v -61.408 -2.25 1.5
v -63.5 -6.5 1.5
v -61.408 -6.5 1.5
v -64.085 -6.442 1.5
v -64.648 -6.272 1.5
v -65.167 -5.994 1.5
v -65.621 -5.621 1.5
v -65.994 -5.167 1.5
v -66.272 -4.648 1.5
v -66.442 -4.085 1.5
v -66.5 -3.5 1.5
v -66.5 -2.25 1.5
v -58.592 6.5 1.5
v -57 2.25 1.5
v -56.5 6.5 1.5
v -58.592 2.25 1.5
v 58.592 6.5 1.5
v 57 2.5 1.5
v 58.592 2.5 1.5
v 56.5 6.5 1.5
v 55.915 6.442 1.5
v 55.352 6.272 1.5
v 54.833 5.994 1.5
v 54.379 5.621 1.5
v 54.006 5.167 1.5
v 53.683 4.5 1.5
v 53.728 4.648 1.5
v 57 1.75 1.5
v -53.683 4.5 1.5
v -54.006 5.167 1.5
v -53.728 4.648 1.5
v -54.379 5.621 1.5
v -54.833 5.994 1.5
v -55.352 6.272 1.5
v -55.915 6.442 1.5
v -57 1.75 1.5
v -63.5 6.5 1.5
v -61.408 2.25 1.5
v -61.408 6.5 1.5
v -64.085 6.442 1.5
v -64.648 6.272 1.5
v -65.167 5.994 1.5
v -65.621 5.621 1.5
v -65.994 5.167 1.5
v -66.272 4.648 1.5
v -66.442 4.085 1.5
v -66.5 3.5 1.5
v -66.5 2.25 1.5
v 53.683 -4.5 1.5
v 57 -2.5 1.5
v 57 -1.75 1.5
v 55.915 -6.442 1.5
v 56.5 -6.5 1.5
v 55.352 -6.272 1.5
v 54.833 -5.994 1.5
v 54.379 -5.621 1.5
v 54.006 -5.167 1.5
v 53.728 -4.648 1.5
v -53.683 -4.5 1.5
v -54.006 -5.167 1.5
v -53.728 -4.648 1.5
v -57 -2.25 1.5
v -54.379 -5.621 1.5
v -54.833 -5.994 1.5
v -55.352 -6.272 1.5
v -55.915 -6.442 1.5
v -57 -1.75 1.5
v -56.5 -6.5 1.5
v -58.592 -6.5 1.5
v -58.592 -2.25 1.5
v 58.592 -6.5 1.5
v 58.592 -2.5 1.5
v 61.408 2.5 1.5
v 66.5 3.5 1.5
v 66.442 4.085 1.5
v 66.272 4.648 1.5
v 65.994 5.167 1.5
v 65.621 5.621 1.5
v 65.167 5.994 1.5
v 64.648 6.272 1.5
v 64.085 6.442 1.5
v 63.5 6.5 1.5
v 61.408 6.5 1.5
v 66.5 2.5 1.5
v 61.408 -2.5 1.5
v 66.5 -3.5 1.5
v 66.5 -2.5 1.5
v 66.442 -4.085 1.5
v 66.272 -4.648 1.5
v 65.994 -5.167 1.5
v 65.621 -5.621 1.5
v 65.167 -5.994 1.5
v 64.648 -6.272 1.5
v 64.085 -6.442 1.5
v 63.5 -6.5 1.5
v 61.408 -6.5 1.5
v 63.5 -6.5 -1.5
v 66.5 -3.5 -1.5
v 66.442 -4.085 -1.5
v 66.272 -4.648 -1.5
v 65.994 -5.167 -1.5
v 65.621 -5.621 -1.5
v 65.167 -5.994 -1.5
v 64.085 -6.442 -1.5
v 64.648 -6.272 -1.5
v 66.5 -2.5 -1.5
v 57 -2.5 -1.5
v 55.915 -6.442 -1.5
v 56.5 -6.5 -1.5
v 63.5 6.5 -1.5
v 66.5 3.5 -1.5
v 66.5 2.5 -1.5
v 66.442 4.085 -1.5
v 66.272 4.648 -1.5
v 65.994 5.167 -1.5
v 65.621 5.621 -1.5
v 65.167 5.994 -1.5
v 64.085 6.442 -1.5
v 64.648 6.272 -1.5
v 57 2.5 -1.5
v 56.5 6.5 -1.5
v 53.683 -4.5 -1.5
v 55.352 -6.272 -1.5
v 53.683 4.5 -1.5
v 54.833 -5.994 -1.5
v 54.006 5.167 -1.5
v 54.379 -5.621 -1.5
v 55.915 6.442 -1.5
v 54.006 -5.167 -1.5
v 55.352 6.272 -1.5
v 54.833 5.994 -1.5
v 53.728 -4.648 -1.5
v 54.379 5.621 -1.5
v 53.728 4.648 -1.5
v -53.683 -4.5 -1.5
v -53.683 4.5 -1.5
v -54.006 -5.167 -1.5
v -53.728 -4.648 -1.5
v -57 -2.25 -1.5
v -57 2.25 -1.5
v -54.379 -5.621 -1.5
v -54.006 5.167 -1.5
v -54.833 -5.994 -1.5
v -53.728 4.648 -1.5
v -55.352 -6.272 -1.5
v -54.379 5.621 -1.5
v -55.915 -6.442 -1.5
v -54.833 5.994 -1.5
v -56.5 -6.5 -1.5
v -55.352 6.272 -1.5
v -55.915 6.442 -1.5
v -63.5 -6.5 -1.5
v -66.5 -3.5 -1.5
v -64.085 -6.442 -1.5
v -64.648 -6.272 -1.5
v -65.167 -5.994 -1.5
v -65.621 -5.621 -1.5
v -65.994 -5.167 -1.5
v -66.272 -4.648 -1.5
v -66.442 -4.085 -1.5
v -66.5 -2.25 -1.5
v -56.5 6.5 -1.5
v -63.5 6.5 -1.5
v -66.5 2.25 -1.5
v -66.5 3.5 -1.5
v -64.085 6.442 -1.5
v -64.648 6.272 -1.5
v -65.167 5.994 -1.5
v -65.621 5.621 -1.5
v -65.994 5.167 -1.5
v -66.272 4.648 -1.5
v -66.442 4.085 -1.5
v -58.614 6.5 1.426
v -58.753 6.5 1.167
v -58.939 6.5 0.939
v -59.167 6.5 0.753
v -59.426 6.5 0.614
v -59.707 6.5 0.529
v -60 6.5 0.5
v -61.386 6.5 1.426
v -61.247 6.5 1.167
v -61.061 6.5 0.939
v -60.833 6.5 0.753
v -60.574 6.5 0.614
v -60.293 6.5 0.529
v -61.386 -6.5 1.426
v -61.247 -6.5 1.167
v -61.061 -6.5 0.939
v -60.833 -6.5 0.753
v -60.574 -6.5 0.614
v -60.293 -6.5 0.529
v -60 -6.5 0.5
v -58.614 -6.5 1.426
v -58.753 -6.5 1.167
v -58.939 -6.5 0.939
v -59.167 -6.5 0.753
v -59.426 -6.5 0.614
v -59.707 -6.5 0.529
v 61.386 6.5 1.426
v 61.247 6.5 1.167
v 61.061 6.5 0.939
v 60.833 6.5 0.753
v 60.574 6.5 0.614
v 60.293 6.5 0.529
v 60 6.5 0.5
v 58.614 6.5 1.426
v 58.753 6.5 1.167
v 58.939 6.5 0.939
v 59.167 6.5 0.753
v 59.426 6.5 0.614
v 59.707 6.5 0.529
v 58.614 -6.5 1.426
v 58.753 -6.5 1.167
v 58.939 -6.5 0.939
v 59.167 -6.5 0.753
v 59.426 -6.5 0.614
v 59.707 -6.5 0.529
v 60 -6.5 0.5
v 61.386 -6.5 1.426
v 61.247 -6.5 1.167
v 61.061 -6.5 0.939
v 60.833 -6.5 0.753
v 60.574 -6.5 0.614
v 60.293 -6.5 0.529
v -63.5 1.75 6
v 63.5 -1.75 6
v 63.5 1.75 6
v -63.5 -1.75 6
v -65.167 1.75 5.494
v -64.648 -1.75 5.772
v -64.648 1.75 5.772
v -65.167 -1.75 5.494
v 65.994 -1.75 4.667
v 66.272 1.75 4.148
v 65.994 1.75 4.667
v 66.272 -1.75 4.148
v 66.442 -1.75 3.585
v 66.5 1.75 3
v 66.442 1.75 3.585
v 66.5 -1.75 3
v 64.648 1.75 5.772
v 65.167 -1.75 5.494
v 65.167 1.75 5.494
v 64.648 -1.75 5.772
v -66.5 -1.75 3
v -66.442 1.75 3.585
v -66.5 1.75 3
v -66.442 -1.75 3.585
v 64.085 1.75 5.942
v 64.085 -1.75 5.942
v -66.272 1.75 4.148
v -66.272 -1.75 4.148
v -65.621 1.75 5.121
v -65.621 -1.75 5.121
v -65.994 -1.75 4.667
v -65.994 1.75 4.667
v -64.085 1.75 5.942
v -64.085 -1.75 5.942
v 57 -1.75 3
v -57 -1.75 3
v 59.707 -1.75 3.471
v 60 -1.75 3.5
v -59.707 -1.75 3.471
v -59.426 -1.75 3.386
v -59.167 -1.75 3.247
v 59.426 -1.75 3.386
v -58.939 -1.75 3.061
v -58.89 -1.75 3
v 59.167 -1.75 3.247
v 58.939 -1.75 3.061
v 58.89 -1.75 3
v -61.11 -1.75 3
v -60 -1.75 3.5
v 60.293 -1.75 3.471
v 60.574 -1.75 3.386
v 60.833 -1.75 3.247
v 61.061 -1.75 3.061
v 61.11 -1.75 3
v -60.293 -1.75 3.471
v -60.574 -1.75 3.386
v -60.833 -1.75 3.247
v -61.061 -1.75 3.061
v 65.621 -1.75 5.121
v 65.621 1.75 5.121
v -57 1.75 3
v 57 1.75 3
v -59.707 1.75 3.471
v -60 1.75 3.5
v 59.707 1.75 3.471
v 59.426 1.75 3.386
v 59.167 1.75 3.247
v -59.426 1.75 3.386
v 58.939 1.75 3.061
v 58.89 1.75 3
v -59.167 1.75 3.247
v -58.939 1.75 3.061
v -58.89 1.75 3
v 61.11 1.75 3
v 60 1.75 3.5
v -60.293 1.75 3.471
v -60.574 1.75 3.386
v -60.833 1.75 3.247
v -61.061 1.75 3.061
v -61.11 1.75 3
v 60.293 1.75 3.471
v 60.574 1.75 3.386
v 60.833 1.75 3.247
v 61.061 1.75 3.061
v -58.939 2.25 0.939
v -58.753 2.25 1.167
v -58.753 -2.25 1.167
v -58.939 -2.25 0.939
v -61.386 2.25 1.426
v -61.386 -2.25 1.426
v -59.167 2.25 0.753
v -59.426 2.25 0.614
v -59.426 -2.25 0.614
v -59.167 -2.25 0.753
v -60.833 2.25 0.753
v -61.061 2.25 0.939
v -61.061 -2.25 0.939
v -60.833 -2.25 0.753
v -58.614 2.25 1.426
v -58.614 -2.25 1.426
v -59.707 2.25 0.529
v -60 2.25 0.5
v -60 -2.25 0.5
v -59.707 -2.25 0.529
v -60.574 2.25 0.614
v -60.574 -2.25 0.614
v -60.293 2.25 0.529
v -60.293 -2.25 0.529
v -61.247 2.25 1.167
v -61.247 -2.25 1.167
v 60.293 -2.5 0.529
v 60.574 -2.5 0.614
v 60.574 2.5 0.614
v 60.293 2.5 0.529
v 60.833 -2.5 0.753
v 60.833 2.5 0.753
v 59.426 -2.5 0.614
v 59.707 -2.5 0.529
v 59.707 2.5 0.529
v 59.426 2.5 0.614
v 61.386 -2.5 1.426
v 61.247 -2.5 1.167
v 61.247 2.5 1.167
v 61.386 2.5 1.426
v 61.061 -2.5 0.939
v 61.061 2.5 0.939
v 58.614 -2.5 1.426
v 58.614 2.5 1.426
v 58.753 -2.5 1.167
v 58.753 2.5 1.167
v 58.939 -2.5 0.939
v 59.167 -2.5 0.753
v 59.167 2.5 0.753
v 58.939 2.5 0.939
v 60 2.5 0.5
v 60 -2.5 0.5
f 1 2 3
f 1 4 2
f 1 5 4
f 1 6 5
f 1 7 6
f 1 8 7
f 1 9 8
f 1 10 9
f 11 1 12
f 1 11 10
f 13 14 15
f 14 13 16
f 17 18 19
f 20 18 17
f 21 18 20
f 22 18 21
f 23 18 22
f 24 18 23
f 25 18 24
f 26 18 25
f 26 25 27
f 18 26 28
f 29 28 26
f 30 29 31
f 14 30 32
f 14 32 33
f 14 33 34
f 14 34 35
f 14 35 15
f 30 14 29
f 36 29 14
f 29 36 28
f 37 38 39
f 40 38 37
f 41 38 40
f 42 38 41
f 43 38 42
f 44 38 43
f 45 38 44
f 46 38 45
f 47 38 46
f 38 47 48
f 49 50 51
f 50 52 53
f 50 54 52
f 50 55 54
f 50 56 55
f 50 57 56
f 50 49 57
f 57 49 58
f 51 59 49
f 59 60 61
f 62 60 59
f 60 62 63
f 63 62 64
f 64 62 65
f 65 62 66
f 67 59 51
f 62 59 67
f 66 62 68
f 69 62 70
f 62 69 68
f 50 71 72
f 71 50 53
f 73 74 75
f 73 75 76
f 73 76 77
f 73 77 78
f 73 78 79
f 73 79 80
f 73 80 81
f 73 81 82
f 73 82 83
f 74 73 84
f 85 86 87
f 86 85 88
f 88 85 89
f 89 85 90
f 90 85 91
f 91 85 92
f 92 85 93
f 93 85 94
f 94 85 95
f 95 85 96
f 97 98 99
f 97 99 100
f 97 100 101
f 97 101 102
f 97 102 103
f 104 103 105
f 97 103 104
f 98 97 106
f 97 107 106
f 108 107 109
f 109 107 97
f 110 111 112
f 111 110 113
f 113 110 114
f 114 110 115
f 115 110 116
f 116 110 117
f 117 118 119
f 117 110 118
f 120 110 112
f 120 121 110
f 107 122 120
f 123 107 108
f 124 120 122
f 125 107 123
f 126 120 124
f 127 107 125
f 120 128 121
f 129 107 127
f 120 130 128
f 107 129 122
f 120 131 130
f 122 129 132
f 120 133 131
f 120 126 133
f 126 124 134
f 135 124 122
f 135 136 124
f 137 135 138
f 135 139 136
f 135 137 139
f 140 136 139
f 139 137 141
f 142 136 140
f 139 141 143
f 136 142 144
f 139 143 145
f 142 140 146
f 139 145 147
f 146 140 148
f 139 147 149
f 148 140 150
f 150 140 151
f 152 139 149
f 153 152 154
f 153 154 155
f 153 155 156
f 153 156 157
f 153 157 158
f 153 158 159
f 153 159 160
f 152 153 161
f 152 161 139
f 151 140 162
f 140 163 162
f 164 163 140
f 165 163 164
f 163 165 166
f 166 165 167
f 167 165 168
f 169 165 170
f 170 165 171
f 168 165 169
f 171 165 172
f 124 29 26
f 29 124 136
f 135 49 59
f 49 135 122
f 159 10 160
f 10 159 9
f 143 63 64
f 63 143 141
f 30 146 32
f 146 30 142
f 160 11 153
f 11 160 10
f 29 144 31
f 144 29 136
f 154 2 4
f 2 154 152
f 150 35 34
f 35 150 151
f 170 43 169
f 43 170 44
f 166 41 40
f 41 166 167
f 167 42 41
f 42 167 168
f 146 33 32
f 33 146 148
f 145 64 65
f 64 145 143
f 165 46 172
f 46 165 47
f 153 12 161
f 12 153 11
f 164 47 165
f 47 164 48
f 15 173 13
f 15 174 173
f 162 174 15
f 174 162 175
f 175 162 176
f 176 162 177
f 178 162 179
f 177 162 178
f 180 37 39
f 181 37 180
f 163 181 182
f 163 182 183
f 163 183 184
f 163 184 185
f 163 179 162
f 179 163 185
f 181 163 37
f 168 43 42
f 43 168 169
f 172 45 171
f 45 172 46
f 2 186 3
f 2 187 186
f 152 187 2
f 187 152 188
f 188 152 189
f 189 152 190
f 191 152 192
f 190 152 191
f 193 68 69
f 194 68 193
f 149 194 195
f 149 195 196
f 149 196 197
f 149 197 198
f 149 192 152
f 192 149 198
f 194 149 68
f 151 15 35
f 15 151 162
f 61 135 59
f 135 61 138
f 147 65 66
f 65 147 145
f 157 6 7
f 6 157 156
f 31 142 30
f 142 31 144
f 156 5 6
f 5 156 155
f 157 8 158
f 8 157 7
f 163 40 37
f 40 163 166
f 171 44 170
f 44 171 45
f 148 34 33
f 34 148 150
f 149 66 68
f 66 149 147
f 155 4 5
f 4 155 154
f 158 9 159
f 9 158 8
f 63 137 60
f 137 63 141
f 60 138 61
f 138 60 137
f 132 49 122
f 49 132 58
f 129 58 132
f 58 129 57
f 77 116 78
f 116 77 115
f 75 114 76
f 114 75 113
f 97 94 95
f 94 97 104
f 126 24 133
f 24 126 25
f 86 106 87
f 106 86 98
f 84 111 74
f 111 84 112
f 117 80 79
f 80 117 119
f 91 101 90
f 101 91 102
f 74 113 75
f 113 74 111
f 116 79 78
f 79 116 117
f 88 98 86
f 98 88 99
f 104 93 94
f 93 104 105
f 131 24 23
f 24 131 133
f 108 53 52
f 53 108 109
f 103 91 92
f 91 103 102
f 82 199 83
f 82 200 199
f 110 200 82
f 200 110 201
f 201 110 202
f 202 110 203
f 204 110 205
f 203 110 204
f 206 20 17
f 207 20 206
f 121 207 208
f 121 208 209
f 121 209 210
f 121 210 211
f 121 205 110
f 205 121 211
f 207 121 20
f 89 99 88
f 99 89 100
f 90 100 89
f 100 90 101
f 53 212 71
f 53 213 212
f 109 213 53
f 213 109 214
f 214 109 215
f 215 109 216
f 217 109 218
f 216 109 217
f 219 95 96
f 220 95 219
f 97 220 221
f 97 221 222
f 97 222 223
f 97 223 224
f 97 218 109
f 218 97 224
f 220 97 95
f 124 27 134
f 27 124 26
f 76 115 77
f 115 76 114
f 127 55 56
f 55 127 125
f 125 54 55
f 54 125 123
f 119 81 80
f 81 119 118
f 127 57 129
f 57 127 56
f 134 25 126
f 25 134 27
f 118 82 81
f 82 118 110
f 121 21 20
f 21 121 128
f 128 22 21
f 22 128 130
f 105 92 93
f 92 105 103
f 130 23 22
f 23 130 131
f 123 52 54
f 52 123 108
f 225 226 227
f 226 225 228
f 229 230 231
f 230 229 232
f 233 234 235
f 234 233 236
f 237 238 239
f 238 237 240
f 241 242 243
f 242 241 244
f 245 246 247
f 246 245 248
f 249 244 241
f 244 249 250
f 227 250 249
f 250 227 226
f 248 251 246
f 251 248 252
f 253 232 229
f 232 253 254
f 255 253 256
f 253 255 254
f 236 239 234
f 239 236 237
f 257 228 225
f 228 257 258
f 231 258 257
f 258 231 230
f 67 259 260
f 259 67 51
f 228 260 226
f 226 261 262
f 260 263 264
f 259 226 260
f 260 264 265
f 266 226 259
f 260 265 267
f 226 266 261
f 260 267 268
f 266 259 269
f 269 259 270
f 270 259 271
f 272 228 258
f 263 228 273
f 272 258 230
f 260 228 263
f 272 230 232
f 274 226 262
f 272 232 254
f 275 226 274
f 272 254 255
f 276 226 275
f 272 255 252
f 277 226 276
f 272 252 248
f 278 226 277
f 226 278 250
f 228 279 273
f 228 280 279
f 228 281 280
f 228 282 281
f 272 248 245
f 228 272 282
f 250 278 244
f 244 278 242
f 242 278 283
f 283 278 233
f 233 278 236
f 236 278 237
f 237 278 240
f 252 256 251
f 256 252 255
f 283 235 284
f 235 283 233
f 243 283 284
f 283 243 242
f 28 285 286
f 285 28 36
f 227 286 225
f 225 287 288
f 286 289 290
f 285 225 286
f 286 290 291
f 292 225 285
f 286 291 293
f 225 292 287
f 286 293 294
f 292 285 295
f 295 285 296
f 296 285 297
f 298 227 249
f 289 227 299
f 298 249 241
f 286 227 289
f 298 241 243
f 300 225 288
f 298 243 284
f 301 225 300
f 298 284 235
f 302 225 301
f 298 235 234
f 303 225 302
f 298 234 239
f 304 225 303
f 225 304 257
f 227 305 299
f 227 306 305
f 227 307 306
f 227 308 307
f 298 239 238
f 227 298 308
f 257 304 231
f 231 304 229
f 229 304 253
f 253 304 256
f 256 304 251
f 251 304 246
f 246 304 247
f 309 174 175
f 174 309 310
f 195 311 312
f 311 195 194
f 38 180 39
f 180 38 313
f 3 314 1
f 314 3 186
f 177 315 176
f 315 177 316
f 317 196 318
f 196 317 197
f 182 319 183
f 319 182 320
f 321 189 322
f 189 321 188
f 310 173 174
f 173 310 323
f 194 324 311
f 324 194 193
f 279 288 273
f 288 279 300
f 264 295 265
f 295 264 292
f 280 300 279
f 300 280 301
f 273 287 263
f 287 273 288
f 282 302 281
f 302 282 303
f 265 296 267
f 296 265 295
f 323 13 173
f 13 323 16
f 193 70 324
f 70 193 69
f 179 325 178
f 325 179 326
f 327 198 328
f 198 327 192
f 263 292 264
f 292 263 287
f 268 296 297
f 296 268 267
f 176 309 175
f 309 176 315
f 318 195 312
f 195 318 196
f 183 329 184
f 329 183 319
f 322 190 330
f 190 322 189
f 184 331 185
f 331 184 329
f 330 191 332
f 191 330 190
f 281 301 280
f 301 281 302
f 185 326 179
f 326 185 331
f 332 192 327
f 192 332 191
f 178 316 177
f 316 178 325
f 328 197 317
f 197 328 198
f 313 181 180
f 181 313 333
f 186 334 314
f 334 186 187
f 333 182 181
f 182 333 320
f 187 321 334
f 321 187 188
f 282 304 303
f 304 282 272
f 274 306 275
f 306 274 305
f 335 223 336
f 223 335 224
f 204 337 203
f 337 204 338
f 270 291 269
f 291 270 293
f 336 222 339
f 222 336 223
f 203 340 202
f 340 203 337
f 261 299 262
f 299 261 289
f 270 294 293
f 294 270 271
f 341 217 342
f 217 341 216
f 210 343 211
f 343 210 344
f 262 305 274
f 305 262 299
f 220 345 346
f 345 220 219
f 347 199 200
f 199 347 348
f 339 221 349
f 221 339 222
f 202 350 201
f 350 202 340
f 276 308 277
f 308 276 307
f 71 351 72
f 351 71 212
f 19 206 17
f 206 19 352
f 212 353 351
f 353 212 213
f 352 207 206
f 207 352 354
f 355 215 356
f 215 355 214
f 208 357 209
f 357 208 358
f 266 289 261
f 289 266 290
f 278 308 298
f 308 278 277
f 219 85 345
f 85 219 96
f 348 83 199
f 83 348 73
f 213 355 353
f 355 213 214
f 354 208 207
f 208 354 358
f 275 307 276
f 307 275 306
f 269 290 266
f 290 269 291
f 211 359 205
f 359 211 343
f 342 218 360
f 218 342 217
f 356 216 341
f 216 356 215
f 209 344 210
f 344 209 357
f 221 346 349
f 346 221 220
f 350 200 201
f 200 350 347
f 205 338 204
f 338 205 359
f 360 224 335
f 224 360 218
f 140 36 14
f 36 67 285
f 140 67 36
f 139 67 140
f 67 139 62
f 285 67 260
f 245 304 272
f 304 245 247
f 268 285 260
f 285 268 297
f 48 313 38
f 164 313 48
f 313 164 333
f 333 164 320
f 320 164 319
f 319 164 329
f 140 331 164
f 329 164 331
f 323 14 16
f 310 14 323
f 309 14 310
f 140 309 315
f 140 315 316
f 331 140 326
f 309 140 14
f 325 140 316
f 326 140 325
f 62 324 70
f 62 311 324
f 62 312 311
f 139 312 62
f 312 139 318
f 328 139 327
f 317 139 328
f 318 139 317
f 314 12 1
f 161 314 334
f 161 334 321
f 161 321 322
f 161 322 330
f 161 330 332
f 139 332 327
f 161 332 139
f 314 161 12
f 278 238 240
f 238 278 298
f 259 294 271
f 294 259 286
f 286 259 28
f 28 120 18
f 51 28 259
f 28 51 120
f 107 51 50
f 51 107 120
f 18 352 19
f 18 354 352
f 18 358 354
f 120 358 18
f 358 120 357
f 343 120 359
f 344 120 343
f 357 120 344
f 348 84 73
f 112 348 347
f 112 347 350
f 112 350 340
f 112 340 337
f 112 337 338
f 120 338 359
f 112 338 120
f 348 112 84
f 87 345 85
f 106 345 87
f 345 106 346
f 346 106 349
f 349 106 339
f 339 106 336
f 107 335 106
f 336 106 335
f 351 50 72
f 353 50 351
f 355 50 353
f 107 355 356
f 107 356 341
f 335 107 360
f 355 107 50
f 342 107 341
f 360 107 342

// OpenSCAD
// Customizer Foot Designer Open_Wire-Spacer
//
// REV 1.0 29/09/2016

// Standard Thingiverse Configurations:
// Range = [:] Slider
// Range = [,] Drop Down Box
// Range = None Text Box

// Start Parameters for for Customizer ----
// preview[view:south, tilt:top]

// between Wires (mm)
spacing = 120; //[30:5:200]

// Diameter (mm)
wire = 3.0; //[2:0.1:6]

difference(){
union() {
  cube([spacing-10,9,3], center=true);
  translate ([-spacing/2,0,-1.5]) 
    roundedRect([10, 10, 3], 3, $fn=32, center=true);
  translate ([spacing/2,0,-1.5]) 
    roundedRect([10, 10, 3], 3, $fn=32, center=true);
  translate ([0,(2+wire/2)/2,1+wire/2]) 
    rotate([90,0,0]) 
      roundedRect([spacing+10, 1+wire, 2+wire/2], 3, $fn=32, center=true);
}
union() {
  translate ([-spacing/2,0,0.5+wire/2]) 
    rotate([90,0,0]) 
      cylinder(20,d=wire,center=true, $fn=32);
  translate ([spacing/2,0,0.5+wire/2]) 
    rotate([90,0,0]) 
      cylinder(20,d=wire,center=true, $fn=32);
  translate ([-spacing/2-3,0,0]) 
    cube([12,3+wire/2,3+wire], center=true);
  translate ([spacing/2+3,0,0]) 
    cube([12,3.5+wire/2,3+wire], center=true);
}
}
// size - [x,y,z]
// radius - radius of corners
module roundedRect(size, radius)
{
	x = size[0];
	y = size[1];
	z = size[2];

	linear_extrude(height=z)
	hull()
	{
		// place 4 circles in the corners, with the given radius
		translate([(-x/2)+(radius/2), (-y/2)+(radius/2), 0])
		circle(r=radius);
	
		translate([(x/2)-(radius/2), (-y/2)+(radius/2), 0])
		circle(r=radius);
	
		translate([(-x/2)+(radius/2), (y/2)-(radius/2), 0])
		circle(r=radius);
	
		translate([(x/2)-(radius/2), (y/2)-(radius/2), 0])
		circle(r=radius);
	}
}
